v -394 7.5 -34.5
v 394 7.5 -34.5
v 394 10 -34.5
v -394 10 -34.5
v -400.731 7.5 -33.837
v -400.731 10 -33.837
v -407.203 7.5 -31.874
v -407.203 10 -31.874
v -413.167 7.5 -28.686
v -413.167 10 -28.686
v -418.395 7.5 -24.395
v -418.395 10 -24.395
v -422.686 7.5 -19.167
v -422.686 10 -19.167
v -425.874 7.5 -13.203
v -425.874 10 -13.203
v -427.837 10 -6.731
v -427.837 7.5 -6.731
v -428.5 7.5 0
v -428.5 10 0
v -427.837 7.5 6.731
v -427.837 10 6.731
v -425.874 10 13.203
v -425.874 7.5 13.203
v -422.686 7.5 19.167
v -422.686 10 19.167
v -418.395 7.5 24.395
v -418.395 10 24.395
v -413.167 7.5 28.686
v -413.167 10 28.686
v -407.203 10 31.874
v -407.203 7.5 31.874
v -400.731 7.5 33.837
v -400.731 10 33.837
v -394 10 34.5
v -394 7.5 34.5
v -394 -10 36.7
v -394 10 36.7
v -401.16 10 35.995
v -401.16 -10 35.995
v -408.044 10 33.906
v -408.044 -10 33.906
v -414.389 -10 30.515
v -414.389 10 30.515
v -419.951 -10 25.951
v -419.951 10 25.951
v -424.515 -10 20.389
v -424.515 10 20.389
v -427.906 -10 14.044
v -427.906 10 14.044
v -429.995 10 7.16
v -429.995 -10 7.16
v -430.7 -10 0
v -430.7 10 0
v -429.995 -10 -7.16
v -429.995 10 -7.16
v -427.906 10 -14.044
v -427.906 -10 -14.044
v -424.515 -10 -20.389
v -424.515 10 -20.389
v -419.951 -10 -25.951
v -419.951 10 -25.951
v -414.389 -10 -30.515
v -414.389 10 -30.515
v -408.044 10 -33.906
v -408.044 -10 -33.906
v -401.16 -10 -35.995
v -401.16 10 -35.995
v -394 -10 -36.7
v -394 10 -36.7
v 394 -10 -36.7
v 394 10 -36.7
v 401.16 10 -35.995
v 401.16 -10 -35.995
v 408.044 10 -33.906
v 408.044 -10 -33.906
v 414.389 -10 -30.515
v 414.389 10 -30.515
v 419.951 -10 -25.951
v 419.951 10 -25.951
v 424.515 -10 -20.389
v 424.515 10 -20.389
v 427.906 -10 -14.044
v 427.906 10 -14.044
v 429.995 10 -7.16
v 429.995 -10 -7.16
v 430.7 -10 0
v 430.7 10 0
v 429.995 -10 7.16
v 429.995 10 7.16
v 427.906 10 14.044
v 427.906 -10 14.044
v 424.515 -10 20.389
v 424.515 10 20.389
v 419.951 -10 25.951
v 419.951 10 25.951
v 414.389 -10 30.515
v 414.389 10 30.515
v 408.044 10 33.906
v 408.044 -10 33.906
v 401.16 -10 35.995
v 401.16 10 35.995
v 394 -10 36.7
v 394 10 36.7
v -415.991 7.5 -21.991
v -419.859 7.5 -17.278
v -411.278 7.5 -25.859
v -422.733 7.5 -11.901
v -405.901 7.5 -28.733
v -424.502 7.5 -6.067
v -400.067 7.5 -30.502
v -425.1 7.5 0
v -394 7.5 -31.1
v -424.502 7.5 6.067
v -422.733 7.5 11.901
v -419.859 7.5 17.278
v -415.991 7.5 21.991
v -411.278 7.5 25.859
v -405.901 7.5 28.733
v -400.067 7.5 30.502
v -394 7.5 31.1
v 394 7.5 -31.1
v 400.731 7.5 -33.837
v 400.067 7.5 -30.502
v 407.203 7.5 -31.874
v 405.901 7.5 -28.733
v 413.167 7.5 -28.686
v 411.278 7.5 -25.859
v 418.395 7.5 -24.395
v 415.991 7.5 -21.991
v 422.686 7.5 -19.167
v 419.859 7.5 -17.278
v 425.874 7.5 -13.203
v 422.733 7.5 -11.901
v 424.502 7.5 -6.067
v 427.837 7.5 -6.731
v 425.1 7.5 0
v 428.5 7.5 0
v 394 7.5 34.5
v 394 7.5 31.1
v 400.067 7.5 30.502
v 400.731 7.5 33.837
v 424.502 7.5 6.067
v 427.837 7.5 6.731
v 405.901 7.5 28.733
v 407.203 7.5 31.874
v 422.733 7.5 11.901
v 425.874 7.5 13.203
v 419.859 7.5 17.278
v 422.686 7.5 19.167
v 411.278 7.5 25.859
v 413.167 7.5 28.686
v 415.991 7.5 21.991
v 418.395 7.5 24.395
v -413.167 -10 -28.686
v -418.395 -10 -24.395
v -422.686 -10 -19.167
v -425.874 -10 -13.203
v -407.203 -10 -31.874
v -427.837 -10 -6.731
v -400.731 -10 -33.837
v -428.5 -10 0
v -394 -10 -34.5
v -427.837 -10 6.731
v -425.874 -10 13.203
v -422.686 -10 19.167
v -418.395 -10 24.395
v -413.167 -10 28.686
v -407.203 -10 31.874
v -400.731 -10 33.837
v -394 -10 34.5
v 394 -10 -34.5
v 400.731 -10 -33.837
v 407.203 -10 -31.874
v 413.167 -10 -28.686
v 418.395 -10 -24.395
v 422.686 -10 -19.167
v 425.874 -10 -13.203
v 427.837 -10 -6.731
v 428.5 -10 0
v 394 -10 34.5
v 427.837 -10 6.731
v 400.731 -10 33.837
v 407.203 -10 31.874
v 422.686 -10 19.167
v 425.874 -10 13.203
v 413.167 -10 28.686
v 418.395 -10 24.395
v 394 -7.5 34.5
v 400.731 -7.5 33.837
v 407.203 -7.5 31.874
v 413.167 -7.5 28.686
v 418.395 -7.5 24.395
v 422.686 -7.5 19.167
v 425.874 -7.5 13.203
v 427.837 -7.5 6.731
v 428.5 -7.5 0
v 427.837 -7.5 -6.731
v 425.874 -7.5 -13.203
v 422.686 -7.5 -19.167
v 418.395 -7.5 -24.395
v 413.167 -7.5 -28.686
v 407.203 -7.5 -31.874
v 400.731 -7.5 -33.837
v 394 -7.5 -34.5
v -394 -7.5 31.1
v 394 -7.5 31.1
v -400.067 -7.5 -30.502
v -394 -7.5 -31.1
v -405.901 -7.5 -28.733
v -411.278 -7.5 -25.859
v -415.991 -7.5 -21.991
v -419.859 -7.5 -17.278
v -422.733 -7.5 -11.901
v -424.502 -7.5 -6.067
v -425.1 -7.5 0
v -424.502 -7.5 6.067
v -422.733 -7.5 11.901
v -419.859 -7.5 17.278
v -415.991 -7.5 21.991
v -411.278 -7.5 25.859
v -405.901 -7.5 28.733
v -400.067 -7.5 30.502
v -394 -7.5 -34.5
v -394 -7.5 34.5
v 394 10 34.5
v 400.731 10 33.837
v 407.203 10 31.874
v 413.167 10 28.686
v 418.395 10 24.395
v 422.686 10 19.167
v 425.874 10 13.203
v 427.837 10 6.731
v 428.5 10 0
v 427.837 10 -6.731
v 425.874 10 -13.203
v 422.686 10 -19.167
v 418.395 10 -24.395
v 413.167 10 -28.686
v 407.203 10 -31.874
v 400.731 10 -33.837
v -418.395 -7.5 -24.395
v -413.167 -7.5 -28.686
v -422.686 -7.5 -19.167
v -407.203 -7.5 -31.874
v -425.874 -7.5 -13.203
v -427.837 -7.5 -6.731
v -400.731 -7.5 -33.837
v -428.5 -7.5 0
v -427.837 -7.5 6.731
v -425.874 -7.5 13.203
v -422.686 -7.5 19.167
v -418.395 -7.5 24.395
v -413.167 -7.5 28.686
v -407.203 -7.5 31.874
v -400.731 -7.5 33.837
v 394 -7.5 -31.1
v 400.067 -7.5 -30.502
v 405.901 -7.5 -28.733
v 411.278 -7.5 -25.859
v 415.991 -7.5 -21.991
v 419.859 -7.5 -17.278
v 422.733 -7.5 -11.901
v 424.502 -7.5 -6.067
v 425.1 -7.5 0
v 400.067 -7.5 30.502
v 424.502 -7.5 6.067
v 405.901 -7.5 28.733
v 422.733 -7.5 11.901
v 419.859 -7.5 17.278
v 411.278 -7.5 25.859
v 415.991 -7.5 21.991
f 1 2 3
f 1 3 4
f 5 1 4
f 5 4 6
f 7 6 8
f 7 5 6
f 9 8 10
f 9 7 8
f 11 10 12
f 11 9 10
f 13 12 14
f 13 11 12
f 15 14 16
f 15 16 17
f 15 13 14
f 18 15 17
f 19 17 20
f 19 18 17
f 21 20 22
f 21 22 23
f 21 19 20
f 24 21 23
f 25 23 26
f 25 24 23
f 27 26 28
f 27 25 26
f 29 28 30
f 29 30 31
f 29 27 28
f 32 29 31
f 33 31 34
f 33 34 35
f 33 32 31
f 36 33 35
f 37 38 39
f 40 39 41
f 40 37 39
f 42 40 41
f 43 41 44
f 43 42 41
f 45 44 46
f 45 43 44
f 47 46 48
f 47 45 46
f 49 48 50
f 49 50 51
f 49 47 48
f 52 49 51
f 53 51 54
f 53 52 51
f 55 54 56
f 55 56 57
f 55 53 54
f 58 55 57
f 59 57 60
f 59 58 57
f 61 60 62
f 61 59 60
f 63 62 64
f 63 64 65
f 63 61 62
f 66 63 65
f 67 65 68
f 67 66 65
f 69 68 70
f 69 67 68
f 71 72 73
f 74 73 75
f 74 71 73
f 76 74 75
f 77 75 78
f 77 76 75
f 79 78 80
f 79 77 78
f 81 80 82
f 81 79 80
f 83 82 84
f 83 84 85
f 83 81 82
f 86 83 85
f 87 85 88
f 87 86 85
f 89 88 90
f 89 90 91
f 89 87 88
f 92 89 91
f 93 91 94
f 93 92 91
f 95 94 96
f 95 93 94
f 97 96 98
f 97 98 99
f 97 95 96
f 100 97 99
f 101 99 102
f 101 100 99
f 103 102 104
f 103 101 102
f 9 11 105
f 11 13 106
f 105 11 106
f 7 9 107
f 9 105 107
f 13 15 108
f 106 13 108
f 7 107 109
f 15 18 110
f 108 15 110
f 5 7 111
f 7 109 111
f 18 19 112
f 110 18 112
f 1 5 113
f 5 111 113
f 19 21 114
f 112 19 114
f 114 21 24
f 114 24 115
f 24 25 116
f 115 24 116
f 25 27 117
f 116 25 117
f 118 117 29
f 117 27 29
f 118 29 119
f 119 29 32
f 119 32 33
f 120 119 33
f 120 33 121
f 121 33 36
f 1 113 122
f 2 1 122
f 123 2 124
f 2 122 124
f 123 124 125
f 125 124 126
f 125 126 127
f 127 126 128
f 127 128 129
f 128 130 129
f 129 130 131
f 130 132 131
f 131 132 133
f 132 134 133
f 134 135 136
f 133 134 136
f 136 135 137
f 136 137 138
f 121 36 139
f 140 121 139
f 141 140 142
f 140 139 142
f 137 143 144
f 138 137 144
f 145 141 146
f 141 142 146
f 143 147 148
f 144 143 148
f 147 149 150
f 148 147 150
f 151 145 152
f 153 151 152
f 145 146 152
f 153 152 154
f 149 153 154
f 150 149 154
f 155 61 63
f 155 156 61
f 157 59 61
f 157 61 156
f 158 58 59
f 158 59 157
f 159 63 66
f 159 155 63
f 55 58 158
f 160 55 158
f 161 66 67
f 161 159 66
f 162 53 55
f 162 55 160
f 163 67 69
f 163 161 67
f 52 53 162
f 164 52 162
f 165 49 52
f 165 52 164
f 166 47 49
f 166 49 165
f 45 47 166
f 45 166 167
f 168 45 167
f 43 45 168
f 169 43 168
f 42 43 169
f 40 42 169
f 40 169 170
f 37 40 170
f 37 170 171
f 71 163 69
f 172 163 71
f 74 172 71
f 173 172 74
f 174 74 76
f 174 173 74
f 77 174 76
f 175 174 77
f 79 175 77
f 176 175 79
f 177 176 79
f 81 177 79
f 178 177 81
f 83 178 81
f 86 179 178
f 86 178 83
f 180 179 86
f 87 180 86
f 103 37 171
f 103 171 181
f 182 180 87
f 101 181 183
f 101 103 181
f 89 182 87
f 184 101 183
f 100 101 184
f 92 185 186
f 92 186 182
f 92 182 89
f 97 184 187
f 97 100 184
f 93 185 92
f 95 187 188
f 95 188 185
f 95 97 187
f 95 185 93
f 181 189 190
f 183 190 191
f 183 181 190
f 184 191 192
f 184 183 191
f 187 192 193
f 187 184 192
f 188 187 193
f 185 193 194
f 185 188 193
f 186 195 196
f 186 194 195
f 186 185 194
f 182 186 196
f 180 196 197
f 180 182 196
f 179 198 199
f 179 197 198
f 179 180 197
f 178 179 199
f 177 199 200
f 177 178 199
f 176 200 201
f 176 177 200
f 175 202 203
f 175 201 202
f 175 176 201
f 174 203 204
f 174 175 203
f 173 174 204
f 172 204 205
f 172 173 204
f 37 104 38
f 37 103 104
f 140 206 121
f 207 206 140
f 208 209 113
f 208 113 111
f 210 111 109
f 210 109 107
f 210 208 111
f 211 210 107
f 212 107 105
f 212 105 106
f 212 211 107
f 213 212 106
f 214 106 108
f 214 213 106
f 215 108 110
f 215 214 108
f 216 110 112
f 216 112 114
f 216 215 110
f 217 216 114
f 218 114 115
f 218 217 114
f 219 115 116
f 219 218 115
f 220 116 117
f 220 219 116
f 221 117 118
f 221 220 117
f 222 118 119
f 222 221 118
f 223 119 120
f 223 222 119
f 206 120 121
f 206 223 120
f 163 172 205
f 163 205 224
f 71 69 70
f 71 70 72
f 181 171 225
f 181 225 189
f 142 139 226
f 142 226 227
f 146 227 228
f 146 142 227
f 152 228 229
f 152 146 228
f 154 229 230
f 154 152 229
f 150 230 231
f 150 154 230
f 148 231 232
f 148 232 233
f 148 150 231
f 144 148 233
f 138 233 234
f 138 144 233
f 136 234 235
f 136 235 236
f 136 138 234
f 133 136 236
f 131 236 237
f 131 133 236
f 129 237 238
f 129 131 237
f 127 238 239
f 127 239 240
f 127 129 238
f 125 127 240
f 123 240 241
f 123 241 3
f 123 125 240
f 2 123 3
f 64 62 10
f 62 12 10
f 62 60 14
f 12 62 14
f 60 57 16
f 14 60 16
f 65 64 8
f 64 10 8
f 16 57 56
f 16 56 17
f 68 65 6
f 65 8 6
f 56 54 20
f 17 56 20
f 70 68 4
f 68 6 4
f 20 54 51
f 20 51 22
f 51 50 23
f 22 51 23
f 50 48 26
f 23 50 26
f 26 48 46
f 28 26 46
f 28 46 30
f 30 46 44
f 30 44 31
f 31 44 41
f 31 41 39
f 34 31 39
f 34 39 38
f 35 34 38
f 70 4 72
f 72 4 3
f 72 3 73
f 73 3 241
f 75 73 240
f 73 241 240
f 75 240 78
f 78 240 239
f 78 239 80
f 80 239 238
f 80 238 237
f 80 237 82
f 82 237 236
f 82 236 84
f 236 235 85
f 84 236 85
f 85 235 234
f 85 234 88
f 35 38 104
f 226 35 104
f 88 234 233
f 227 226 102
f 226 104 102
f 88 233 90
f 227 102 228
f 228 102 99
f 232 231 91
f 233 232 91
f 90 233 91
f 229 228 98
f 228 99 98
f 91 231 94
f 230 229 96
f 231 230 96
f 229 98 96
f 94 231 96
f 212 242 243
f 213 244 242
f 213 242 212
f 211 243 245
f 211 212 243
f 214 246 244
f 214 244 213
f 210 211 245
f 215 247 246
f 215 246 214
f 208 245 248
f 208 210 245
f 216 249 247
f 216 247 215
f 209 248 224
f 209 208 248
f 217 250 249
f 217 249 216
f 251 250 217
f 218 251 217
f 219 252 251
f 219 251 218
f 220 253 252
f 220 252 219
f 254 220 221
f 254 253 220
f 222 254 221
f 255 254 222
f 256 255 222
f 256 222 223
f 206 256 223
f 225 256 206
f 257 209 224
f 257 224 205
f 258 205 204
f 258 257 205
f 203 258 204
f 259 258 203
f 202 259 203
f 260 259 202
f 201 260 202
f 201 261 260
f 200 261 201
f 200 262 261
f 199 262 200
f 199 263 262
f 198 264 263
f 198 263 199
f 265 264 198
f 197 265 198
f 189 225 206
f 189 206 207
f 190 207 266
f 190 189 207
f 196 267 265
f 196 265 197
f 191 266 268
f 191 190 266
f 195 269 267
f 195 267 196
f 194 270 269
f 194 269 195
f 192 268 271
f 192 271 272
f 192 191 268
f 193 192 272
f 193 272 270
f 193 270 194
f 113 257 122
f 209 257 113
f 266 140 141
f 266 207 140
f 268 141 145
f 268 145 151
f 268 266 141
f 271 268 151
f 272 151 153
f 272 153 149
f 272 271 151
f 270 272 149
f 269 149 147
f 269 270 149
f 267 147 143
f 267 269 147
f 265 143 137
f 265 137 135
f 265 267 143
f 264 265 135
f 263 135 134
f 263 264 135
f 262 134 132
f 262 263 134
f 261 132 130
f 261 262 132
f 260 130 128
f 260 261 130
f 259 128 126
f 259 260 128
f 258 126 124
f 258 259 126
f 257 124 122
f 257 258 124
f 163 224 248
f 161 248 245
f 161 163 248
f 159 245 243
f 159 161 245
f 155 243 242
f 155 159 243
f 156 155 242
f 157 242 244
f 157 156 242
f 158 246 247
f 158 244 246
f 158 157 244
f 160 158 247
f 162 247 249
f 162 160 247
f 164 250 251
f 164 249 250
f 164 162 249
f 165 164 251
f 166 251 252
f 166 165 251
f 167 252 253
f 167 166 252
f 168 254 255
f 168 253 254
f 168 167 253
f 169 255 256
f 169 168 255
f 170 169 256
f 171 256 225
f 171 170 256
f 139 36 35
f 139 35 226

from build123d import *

# Parameters (mm, degrees)
F1_DEPTH = 10
F3_DEPTH = 7.5


with BuildPart() as f1:
    # F0 (on Front) → F1 (new body, symmetric)
    with BuildSketch(Plane.XZ):
        with BuildLine():
            Line((394, 36.7), (-394, 36.7))
            ThreePointArc((-394, 36.7), (-430.7, 0), (-394, -36.7))
            Line((-394, -36.7), (394, -36.7))
            ThreePointArc((394, -36.7), (430.7, 0), (394, 36.7))
        make_face()
        with BuildLine():
            Line((394, -34.5), (-394, -34.5))
            ThreePointArc((-394, -34.5), (-428.5, 0), (-394, 34.5))
            Line((-394, 34.5), (394, 34.5))
            ThreePointArc((394, 34.5), (428.5, 0), (394, -34.5))
        make_face(mode=Mode.SUBTRACT)
    extrude(amount=F1_DEPTH, both=True)

    # F2 (on Front) → F3 (join, symmetric)
    with BuildSketch(Plane.XZ):
        with BuildLine():
            Line((394, 34.5), (-394, 34.5))
            ThreePointArc((-394, 34.5), (-428.5, 0), (-394, -34.5))
            Line((-394, -34.5), (394, -34.5))
            ThreePointArc((394, -34.5), (428.5, 0), (394, 34.5))
        make_face()
        with BuildLine():
            ThreePointArc((-394, -31.1), (-425.1, 0), (-394, 31.1))
            Line((-394, 31.1), (394, 31.1))
            ThreePointArc((394, 31.1), (425.1, 0), (394, -31.1))
            Line((394, -31.1), (-394, -31.1))
        make_face(mode=Mode.SUBTRACT)
    extrude(amount=F3_DEPTH, both=True)


solid = f1.part
